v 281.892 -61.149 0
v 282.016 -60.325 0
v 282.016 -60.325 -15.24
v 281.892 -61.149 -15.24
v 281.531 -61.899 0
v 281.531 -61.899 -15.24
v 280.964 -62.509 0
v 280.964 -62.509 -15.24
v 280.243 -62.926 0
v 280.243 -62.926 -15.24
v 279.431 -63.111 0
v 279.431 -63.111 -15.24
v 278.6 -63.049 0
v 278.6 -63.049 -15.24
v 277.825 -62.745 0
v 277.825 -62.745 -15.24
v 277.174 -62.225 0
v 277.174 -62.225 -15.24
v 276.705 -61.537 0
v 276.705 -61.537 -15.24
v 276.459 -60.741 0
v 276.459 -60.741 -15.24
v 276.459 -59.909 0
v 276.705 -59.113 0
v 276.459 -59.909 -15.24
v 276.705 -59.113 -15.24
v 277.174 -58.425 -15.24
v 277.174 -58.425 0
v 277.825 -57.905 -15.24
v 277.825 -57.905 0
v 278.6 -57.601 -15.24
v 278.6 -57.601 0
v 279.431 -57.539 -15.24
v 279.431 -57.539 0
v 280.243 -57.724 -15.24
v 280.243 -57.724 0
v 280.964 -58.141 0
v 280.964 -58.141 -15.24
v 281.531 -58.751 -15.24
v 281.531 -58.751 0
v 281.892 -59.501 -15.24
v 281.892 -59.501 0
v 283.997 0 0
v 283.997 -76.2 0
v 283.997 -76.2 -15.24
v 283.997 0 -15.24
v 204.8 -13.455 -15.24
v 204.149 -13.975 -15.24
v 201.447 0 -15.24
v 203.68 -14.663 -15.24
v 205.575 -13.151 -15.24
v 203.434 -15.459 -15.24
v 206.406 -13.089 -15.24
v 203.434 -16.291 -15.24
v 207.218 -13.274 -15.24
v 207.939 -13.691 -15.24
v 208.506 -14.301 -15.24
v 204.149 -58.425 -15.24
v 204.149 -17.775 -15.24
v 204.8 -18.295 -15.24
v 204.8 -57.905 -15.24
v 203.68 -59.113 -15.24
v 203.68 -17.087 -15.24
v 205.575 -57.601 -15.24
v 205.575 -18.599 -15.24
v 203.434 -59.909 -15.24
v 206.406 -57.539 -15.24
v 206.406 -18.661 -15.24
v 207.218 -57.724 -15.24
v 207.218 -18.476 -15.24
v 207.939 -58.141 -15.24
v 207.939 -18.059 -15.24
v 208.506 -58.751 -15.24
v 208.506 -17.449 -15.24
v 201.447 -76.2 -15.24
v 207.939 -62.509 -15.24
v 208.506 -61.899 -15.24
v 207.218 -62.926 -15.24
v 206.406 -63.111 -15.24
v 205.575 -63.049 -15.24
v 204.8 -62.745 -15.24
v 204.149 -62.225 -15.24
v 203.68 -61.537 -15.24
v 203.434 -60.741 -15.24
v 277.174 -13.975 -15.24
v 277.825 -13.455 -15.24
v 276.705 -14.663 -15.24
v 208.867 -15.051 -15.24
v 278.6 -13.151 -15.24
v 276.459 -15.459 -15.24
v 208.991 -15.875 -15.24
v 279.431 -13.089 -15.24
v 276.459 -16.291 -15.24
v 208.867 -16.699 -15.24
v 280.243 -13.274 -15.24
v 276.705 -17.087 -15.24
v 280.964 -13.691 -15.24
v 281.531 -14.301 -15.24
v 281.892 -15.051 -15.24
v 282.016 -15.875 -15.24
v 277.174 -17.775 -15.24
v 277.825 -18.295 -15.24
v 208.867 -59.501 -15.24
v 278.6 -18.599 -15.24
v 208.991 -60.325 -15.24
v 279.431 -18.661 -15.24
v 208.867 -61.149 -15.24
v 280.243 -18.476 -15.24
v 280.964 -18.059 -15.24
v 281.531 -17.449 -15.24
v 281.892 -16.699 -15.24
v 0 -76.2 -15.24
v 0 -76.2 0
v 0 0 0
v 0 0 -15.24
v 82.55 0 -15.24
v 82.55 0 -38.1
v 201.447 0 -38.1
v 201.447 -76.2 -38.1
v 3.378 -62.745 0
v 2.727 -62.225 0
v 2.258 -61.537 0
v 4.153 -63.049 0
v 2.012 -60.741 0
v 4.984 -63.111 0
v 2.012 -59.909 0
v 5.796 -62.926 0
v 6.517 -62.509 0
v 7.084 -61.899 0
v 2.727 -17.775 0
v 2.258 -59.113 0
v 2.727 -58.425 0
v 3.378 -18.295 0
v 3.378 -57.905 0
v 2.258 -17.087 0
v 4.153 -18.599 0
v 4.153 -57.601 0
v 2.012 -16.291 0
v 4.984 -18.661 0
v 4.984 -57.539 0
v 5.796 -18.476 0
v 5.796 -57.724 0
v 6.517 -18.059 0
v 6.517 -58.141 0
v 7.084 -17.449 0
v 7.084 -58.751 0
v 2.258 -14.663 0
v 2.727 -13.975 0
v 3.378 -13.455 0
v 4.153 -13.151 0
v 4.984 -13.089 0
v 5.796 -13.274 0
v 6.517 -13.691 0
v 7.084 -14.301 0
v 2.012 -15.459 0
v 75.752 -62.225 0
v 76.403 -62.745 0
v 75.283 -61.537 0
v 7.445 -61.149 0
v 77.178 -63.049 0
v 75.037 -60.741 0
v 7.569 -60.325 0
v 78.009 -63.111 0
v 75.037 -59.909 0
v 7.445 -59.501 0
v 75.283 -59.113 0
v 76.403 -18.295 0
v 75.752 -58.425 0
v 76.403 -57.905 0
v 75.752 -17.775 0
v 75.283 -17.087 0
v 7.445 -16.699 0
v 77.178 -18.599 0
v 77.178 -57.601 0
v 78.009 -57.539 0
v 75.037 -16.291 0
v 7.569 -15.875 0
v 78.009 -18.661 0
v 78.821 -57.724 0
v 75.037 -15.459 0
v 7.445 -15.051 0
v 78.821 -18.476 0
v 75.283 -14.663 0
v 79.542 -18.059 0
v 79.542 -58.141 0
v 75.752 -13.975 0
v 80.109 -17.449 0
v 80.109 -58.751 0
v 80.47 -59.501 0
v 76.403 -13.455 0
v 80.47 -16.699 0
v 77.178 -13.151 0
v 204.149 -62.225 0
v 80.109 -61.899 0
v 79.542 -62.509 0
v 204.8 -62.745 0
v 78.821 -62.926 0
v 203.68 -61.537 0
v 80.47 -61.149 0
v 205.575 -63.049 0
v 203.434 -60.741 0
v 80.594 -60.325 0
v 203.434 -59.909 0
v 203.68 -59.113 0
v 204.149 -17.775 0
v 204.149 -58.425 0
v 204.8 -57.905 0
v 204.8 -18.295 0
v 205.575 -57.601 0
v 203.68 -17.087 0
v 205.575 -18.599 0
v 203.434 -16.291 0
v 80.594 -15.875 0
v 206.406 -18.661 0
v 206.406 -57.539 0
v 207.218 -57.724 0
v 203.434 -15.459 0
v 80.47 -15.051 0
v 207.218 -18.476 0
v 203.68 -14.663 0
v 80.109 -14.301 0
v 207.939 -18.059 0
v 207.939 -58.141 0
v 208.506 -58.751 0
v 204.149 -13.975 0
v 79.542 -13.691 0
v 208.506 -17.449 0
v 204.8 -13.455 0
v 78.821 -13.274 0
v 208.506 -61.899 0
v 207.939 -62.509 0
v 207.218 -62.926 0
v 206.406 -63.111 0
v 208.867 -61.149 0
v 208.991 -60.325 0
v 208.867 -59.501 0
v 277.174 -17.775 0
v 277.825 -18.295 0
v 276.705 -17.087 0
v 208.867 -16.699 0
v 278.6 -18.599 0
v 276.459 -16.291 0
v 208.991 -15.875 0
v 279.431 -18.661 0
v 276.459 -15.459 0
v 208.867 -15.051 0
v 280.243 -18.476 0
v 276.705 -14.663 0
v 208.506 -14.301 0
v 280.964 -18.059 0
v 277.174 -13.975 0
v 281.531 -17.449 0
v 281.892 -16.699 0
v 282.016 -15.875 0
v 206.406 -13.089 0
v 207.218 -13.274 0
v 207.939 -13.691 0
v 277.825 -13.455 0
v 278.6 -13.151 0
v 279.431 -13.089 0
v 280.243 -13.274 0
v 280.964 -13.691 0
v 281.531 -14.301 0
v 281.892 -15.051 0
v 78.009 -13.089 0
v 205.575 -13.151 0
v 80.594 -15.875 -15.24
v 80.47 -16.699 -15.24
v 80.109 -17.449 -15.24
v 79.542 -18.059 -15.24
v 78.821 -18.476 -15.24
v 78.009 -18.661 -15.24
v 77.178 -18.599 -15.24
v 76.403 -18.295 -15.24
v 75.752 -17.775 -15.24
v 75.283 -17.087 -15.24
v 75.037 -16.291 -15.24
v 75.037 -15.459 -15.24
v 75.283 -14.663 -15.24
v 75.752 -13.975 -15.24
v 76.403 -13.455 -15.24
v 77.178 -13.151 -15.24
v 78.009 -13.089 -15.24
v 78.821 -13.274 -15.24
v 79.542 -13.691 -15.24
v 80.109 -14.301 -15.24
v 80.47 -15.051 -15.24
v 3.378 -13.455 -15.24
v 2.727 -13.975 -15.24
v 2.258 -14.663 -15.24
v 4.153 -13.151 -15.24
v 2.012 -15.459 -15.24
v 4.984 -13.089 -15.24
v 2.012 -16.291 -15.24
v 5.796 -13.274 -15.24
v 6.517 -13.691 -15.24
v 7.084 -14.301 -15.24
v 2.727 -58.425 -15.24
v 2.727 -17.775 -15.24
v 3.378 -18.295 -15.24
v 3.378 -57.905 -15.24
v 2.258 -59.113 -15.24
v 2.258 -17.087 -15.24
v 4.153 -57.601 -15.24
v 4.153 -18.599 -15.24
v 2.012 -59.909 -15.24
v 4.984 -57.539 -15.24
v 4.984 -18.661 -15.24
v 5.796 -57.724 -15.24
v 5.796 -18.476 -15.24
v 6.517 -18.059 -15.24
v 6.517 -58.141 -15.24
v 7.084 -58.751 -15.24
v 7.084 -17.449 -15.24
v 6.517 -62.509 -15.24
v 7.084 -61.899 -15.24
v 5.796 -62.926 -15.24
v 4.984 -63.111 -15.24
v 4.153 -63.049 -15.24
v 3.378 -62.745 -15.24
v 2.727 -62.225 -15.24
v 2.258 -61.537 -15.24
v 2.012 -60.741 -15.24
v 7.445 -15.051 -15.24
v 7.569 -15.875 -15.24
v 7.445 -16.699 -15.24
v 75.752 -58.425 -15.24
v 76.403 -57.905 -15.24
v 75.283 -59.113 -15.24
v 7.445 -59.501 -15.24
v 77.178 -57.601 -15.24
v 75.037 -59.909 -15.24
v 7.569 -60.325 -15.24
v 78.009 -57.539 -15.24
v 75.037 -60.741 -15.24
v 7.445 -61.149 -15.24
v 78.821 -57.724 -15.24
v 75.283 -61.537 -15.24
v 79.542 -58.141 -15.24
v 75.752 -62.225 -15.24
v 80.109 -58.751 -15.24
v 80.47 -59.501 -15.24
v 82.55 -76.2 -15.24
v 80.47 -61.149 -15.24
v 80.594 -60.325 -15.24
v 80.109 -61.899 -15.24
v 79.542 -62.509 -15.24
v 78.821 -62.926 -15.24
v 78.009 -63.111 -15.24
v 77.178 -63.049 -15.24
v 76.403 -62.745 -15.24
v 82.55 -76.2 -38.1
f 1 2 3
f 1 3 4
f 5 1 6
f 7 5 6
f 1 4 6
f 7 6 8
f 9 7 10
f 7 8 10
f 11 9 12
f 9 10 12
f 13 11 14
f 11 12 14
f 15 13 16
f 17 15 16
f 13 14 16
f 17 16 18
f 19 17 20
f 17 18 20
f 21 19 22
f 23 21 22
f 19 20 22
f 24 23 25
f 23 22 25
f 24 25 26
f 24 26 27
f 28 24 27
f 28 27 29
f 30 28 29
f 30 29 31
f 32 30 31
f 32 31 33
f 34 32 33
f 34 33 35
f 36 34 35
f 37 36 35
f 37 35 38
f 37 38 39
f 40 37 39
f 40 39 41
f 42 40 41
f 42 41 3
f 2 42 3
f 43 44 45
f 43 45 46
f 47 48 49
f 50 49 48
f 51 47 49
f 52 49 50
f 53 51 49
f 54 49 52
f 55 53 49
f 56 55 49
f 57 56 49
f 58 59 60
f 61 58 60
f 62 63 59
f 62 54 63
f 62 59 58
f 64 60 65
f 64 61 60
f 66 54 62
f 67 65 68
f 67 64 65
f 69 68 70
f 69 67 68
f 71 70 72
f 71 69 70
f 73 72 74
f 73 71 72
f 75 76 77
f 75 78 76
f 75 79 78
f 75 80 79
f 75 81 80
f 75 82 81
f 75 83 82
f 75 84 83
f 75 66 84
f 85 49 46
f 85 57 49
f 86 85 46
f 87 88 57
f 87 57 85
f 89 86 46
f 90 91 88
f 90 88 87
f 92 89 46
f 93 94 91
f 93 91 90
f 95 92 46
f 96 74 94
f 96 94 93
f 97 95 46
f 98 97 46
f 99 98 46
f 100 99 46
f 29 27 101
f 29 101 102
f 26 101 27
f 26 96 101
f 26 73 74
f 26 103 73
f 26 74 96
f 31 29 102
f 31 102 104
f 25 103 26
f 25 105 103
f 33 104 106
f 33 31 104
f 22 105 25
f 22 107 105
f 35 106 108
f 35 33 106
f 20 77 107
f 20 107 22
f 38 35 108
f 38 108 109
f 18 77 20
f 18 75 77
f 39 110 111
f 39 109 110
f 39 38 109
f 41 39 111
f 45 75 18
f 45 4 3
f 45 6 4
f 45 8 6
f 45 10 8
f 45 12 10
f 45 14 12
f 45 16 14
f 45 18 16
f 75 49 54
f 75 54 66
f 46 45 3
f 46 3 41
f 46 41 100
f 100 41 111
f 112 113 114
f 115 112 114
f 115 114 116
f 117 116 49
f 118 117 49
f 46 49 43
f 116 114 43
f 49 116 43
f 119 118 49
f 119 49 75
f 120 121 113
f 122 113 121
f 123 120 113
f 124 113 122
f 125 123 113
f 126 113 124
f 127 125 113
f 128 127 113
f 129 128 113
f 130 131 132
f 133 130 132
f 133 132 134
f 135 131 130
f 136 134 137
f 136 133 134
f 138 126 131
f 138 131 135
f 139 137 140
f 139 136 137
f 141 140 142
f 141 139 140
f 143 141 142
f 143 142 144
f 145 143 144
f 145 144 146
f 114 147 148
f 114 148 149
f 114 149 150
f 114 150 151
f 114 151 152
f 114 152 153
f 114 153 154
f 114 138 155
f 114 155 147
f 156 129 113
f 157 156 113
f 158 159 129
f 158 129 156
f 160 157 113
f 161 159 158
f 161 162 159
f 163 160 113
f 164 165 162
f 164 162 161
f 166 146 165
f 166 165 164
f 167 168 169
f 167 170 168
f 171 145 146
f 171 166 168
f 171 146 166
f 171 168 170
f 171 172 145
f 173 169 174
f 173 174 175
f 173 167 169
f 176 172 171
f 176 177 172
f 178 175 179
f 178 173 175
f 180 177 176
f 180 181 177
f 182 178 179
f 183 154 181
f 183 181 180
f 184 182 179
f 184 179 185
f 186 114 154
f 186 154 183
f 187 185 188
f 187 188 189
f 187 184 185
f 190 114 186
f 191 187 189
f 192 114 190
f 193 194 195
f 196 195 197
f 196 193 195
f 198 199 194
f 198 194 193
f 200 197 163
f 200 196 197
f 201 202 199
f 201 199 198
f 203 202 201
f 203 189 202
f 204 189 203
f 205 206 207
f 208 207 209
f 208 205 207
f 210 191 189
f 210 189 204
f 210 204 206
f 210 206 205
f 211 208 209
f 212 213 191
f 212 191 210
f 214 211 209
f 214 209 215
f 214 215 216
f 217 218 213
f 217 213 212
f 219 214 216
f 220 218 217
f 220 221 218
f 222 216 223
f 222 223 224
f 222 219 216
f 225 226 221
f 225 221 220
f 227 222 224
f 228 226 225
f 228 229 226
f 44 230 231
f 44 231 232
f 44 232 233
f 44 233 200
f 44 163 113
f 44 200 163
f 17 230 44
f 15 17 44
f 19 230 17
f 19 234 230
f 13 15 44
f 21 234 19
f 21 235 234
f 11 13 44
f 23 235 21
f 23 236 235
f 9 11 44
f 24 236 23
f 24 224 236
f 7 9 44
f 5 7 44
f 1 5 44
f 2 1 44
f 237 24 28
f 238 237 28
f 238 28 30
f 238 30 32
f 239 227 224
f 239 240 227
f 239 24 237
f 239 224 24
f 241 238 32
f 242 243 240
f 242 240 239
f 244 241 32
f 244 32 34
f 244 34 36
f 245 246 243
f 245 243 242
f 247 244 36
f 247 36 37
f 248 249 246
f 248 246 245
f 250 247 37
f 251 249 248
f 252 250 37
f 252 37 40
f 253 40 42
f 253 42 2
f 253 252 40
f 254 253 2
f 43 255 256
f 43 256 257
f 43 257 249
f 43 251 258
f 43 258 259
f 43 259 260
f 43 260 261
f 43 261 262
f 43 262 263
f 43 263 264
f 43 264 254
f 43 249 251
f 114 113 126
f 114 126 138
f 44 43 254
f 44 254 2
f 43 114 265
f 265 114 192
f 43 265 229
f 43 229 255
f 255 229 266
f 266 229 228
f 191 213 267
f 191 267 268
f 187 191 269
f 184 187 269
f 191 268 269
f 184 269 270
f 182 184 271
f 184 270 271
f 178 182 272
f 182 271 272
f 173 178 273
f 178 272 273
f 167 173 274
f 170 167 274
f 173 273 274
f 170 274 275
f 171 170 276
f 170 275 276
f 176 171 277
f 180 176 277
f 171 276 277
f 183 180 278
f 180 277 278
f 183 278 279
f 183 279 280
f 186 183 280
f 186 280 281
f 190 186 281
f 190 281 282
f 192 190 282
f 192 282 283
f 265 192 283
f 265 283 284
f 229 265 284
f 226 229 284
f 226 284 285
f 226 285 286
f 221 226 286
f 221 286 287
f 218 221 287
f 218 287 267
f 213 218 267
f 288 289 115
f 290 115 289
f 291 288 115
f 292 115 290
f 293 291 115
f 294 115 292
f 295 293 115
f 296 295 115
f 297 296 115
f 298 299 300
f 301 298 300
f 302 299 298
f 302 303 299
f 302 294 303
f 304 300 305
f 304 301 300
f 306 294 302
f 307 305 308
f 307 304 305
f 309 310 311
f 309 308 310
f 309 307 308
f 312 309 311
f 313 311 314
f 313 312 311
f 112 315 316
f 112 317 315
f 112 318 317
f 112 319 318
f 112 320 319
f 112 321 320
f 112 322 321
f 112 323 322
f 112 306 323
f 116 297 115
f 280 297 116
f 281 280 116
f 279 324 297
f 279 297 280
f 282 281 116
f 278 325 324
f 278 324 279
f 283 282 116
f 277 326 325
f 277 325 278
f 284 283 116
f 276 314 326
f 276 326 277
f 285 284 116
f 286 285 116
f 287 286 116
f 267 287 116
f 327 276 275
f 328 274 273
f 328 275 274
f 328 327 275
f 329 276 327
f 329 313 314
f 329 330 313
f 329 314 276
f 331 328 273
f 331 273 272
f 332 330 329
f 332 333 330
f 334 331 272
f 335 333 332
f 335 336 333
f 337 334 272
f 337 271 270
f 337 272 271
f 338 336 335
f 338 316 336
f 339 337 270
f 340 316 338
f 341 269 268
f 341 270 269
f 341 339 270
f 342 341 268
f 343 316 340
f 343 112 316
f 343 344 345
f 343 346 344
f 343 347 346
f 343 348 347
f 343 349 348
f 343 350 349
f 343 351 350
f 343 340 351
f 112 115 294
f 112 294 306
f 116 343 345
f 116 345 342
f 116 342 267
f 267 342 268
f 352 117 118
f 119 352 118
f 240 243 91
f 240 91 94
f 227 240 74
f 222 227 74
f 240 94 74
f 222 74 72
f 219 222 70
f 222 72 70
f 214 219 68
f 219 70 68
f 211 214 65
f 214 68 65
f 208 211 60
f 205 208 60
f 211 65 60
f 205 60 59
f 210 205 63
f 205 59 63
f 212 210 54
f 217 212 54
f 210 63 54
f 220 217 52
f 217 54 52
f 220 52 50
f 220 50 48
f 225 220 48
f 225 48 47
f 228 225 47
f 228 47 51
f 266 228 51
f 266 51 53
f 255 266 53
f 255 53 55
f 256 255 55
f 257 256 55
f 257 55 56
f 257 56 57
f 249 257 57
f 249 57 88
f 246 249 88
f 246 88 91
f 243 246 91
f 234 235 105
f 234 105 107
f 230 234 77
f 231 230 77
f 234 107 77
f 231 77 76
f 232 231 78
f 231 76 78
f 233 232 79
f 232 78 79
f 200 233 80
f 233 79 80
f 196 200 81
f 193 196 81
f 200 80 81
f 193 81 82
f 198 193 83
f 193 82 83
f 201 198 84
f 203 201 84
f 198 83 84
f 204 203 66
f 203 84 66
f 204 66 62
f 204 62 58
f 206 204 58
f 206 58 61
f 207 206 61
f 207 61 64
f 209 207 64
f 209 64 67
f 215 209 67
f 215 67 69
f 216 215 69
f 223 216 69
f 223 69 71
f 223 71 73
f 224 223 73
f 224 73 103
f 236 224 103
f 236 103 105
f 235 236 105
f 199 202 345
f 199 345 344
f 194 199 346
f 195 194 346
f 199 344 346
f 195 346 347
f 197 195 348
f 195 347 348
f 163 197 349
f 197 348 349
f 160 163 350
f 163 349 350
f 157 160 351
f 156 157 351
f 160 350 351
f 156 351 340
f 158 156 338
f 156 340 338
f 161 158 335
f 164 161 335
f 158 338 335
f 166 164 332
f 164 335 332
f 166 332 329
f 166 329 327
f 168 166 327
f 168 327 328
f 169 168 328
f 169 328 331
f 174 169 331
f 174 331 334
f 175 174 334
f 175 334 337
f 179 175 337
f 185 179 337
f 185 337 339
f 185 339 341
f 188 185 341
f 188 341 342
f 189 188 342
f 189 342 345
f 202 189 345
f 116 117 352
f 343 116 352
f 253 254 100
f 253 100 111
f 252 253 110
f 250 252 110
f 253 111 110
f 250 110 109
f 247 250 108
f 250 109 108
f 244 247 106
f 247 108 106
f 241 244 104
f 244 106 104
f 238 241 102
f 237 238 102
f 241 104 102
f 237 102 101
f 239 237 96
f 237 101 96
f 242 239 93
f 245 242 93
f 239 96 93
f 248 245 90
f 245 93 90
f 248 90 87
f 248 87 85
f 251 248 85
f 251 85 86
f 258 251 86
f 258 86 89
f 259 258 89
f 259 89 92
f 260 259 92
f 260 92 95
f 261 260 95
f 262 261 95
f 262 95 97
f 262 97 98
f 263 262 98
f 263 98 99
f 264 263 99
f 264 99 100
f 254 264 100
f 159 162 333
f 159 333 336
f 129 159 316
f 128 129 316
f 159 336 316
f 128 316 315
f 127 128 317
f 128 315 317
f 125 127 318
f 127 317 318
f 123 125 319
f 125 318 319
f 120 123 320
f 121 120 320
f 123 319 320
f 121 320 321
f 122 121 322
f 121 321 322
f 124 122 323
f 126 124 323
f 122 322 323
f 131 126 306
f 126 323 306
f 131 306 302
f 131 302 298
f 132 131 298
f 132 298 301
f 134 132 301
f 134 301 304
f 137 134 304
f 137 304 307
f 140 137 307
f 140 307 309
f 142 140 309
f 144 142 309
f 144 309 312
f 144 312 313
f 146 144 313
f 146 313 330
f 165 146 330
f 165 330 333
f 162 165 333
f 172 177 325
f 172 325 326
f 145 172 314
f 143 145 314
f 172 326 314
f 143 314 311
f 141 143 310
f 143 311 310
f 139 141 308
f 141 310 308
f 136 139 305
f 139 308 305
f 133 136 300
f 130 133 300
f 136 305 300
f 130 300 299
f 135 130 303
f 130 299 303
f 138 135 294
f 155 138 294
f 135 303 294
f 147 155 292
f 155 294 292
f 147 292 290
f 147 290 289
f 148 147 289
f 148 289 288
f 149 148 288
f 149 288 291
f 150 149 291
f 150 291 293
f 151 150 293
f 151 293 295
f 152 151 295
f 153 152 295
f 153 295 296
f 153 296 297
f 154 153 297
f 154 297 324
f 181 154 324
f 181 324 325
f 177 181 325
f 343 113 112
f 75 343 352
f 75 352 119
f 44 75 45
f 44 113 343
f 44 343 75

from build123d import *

# Parameters (mm, degrees)
F0_W     = 283.9974
F0_H     = 76.2
F1_DEPTH = 38.1
F4_R     = 2.794
F3_R     = 2.794
F5_DEPTH = 38.101
F2_W     = 82.55
F2_H     = 76.2
F6_DEPTH = 22.86


with BuildPart() as f1:
    # F0 (on Top) → F1 (new body)
    with BuildSketch(Plane.XY):
        with Locations((141.9987, -38.1)):
            Rectangle(F0_W, F0_H)
    extrude(amount=-F1_DEPTH)

    # F4 (on face) + F3 (on face) → F5 (cut, through all)
    with BuildSketch(Plane(origin=(0, 0, -38.1), x_dir=(1, 0, 0), z_dir=(0, 0, -1))):
        with Locations((279.2222, 15.875)):
            Circle(F4_R)
        with Locations((279.2222, 60.325)):
            Circle(F4_R)
        with Locations((206.1972, 60.325)):
            Circle(F4_R)
        with Locations((206.1972, 15.875)):
            Circle(F4_R)
    with BuildSketch(Plane(origin=(0, 0, -38.1), x_dir=(1, 0, 0), z_dir=(0, 0, -1))):
        with Locations((77.8002, 60.325)):
            Circle(F3_R)
        with Locations((77.8002, 15.875)):
            Circle(F3_R)
        with Locations((4.7752, 15.875)):
            Circle(F3_R)
        with Locations((4.7752, 60.325)):
            Circle(F3_R)
    extrude(amount=-F5_DEPTH, mode=Mode.SUBTRACT)

    # F2 (on face) → F6 (cut)
    with BuildSketch(Plane(origin=(0, 0, -38.1), x_dir=(1, 0, 0), z_dir=(0, 0, -1))):
        with Locations((41.275, 38.1)):
            Rectangle(F2_W, F2_H)
        with Locations((242.7224, 38.1)):
            Rectangle(F2_W, F2_H)
    extrude(amount=-F6_DEPTH, mode=Mode.SUBTRACT)


solid = f1.part
